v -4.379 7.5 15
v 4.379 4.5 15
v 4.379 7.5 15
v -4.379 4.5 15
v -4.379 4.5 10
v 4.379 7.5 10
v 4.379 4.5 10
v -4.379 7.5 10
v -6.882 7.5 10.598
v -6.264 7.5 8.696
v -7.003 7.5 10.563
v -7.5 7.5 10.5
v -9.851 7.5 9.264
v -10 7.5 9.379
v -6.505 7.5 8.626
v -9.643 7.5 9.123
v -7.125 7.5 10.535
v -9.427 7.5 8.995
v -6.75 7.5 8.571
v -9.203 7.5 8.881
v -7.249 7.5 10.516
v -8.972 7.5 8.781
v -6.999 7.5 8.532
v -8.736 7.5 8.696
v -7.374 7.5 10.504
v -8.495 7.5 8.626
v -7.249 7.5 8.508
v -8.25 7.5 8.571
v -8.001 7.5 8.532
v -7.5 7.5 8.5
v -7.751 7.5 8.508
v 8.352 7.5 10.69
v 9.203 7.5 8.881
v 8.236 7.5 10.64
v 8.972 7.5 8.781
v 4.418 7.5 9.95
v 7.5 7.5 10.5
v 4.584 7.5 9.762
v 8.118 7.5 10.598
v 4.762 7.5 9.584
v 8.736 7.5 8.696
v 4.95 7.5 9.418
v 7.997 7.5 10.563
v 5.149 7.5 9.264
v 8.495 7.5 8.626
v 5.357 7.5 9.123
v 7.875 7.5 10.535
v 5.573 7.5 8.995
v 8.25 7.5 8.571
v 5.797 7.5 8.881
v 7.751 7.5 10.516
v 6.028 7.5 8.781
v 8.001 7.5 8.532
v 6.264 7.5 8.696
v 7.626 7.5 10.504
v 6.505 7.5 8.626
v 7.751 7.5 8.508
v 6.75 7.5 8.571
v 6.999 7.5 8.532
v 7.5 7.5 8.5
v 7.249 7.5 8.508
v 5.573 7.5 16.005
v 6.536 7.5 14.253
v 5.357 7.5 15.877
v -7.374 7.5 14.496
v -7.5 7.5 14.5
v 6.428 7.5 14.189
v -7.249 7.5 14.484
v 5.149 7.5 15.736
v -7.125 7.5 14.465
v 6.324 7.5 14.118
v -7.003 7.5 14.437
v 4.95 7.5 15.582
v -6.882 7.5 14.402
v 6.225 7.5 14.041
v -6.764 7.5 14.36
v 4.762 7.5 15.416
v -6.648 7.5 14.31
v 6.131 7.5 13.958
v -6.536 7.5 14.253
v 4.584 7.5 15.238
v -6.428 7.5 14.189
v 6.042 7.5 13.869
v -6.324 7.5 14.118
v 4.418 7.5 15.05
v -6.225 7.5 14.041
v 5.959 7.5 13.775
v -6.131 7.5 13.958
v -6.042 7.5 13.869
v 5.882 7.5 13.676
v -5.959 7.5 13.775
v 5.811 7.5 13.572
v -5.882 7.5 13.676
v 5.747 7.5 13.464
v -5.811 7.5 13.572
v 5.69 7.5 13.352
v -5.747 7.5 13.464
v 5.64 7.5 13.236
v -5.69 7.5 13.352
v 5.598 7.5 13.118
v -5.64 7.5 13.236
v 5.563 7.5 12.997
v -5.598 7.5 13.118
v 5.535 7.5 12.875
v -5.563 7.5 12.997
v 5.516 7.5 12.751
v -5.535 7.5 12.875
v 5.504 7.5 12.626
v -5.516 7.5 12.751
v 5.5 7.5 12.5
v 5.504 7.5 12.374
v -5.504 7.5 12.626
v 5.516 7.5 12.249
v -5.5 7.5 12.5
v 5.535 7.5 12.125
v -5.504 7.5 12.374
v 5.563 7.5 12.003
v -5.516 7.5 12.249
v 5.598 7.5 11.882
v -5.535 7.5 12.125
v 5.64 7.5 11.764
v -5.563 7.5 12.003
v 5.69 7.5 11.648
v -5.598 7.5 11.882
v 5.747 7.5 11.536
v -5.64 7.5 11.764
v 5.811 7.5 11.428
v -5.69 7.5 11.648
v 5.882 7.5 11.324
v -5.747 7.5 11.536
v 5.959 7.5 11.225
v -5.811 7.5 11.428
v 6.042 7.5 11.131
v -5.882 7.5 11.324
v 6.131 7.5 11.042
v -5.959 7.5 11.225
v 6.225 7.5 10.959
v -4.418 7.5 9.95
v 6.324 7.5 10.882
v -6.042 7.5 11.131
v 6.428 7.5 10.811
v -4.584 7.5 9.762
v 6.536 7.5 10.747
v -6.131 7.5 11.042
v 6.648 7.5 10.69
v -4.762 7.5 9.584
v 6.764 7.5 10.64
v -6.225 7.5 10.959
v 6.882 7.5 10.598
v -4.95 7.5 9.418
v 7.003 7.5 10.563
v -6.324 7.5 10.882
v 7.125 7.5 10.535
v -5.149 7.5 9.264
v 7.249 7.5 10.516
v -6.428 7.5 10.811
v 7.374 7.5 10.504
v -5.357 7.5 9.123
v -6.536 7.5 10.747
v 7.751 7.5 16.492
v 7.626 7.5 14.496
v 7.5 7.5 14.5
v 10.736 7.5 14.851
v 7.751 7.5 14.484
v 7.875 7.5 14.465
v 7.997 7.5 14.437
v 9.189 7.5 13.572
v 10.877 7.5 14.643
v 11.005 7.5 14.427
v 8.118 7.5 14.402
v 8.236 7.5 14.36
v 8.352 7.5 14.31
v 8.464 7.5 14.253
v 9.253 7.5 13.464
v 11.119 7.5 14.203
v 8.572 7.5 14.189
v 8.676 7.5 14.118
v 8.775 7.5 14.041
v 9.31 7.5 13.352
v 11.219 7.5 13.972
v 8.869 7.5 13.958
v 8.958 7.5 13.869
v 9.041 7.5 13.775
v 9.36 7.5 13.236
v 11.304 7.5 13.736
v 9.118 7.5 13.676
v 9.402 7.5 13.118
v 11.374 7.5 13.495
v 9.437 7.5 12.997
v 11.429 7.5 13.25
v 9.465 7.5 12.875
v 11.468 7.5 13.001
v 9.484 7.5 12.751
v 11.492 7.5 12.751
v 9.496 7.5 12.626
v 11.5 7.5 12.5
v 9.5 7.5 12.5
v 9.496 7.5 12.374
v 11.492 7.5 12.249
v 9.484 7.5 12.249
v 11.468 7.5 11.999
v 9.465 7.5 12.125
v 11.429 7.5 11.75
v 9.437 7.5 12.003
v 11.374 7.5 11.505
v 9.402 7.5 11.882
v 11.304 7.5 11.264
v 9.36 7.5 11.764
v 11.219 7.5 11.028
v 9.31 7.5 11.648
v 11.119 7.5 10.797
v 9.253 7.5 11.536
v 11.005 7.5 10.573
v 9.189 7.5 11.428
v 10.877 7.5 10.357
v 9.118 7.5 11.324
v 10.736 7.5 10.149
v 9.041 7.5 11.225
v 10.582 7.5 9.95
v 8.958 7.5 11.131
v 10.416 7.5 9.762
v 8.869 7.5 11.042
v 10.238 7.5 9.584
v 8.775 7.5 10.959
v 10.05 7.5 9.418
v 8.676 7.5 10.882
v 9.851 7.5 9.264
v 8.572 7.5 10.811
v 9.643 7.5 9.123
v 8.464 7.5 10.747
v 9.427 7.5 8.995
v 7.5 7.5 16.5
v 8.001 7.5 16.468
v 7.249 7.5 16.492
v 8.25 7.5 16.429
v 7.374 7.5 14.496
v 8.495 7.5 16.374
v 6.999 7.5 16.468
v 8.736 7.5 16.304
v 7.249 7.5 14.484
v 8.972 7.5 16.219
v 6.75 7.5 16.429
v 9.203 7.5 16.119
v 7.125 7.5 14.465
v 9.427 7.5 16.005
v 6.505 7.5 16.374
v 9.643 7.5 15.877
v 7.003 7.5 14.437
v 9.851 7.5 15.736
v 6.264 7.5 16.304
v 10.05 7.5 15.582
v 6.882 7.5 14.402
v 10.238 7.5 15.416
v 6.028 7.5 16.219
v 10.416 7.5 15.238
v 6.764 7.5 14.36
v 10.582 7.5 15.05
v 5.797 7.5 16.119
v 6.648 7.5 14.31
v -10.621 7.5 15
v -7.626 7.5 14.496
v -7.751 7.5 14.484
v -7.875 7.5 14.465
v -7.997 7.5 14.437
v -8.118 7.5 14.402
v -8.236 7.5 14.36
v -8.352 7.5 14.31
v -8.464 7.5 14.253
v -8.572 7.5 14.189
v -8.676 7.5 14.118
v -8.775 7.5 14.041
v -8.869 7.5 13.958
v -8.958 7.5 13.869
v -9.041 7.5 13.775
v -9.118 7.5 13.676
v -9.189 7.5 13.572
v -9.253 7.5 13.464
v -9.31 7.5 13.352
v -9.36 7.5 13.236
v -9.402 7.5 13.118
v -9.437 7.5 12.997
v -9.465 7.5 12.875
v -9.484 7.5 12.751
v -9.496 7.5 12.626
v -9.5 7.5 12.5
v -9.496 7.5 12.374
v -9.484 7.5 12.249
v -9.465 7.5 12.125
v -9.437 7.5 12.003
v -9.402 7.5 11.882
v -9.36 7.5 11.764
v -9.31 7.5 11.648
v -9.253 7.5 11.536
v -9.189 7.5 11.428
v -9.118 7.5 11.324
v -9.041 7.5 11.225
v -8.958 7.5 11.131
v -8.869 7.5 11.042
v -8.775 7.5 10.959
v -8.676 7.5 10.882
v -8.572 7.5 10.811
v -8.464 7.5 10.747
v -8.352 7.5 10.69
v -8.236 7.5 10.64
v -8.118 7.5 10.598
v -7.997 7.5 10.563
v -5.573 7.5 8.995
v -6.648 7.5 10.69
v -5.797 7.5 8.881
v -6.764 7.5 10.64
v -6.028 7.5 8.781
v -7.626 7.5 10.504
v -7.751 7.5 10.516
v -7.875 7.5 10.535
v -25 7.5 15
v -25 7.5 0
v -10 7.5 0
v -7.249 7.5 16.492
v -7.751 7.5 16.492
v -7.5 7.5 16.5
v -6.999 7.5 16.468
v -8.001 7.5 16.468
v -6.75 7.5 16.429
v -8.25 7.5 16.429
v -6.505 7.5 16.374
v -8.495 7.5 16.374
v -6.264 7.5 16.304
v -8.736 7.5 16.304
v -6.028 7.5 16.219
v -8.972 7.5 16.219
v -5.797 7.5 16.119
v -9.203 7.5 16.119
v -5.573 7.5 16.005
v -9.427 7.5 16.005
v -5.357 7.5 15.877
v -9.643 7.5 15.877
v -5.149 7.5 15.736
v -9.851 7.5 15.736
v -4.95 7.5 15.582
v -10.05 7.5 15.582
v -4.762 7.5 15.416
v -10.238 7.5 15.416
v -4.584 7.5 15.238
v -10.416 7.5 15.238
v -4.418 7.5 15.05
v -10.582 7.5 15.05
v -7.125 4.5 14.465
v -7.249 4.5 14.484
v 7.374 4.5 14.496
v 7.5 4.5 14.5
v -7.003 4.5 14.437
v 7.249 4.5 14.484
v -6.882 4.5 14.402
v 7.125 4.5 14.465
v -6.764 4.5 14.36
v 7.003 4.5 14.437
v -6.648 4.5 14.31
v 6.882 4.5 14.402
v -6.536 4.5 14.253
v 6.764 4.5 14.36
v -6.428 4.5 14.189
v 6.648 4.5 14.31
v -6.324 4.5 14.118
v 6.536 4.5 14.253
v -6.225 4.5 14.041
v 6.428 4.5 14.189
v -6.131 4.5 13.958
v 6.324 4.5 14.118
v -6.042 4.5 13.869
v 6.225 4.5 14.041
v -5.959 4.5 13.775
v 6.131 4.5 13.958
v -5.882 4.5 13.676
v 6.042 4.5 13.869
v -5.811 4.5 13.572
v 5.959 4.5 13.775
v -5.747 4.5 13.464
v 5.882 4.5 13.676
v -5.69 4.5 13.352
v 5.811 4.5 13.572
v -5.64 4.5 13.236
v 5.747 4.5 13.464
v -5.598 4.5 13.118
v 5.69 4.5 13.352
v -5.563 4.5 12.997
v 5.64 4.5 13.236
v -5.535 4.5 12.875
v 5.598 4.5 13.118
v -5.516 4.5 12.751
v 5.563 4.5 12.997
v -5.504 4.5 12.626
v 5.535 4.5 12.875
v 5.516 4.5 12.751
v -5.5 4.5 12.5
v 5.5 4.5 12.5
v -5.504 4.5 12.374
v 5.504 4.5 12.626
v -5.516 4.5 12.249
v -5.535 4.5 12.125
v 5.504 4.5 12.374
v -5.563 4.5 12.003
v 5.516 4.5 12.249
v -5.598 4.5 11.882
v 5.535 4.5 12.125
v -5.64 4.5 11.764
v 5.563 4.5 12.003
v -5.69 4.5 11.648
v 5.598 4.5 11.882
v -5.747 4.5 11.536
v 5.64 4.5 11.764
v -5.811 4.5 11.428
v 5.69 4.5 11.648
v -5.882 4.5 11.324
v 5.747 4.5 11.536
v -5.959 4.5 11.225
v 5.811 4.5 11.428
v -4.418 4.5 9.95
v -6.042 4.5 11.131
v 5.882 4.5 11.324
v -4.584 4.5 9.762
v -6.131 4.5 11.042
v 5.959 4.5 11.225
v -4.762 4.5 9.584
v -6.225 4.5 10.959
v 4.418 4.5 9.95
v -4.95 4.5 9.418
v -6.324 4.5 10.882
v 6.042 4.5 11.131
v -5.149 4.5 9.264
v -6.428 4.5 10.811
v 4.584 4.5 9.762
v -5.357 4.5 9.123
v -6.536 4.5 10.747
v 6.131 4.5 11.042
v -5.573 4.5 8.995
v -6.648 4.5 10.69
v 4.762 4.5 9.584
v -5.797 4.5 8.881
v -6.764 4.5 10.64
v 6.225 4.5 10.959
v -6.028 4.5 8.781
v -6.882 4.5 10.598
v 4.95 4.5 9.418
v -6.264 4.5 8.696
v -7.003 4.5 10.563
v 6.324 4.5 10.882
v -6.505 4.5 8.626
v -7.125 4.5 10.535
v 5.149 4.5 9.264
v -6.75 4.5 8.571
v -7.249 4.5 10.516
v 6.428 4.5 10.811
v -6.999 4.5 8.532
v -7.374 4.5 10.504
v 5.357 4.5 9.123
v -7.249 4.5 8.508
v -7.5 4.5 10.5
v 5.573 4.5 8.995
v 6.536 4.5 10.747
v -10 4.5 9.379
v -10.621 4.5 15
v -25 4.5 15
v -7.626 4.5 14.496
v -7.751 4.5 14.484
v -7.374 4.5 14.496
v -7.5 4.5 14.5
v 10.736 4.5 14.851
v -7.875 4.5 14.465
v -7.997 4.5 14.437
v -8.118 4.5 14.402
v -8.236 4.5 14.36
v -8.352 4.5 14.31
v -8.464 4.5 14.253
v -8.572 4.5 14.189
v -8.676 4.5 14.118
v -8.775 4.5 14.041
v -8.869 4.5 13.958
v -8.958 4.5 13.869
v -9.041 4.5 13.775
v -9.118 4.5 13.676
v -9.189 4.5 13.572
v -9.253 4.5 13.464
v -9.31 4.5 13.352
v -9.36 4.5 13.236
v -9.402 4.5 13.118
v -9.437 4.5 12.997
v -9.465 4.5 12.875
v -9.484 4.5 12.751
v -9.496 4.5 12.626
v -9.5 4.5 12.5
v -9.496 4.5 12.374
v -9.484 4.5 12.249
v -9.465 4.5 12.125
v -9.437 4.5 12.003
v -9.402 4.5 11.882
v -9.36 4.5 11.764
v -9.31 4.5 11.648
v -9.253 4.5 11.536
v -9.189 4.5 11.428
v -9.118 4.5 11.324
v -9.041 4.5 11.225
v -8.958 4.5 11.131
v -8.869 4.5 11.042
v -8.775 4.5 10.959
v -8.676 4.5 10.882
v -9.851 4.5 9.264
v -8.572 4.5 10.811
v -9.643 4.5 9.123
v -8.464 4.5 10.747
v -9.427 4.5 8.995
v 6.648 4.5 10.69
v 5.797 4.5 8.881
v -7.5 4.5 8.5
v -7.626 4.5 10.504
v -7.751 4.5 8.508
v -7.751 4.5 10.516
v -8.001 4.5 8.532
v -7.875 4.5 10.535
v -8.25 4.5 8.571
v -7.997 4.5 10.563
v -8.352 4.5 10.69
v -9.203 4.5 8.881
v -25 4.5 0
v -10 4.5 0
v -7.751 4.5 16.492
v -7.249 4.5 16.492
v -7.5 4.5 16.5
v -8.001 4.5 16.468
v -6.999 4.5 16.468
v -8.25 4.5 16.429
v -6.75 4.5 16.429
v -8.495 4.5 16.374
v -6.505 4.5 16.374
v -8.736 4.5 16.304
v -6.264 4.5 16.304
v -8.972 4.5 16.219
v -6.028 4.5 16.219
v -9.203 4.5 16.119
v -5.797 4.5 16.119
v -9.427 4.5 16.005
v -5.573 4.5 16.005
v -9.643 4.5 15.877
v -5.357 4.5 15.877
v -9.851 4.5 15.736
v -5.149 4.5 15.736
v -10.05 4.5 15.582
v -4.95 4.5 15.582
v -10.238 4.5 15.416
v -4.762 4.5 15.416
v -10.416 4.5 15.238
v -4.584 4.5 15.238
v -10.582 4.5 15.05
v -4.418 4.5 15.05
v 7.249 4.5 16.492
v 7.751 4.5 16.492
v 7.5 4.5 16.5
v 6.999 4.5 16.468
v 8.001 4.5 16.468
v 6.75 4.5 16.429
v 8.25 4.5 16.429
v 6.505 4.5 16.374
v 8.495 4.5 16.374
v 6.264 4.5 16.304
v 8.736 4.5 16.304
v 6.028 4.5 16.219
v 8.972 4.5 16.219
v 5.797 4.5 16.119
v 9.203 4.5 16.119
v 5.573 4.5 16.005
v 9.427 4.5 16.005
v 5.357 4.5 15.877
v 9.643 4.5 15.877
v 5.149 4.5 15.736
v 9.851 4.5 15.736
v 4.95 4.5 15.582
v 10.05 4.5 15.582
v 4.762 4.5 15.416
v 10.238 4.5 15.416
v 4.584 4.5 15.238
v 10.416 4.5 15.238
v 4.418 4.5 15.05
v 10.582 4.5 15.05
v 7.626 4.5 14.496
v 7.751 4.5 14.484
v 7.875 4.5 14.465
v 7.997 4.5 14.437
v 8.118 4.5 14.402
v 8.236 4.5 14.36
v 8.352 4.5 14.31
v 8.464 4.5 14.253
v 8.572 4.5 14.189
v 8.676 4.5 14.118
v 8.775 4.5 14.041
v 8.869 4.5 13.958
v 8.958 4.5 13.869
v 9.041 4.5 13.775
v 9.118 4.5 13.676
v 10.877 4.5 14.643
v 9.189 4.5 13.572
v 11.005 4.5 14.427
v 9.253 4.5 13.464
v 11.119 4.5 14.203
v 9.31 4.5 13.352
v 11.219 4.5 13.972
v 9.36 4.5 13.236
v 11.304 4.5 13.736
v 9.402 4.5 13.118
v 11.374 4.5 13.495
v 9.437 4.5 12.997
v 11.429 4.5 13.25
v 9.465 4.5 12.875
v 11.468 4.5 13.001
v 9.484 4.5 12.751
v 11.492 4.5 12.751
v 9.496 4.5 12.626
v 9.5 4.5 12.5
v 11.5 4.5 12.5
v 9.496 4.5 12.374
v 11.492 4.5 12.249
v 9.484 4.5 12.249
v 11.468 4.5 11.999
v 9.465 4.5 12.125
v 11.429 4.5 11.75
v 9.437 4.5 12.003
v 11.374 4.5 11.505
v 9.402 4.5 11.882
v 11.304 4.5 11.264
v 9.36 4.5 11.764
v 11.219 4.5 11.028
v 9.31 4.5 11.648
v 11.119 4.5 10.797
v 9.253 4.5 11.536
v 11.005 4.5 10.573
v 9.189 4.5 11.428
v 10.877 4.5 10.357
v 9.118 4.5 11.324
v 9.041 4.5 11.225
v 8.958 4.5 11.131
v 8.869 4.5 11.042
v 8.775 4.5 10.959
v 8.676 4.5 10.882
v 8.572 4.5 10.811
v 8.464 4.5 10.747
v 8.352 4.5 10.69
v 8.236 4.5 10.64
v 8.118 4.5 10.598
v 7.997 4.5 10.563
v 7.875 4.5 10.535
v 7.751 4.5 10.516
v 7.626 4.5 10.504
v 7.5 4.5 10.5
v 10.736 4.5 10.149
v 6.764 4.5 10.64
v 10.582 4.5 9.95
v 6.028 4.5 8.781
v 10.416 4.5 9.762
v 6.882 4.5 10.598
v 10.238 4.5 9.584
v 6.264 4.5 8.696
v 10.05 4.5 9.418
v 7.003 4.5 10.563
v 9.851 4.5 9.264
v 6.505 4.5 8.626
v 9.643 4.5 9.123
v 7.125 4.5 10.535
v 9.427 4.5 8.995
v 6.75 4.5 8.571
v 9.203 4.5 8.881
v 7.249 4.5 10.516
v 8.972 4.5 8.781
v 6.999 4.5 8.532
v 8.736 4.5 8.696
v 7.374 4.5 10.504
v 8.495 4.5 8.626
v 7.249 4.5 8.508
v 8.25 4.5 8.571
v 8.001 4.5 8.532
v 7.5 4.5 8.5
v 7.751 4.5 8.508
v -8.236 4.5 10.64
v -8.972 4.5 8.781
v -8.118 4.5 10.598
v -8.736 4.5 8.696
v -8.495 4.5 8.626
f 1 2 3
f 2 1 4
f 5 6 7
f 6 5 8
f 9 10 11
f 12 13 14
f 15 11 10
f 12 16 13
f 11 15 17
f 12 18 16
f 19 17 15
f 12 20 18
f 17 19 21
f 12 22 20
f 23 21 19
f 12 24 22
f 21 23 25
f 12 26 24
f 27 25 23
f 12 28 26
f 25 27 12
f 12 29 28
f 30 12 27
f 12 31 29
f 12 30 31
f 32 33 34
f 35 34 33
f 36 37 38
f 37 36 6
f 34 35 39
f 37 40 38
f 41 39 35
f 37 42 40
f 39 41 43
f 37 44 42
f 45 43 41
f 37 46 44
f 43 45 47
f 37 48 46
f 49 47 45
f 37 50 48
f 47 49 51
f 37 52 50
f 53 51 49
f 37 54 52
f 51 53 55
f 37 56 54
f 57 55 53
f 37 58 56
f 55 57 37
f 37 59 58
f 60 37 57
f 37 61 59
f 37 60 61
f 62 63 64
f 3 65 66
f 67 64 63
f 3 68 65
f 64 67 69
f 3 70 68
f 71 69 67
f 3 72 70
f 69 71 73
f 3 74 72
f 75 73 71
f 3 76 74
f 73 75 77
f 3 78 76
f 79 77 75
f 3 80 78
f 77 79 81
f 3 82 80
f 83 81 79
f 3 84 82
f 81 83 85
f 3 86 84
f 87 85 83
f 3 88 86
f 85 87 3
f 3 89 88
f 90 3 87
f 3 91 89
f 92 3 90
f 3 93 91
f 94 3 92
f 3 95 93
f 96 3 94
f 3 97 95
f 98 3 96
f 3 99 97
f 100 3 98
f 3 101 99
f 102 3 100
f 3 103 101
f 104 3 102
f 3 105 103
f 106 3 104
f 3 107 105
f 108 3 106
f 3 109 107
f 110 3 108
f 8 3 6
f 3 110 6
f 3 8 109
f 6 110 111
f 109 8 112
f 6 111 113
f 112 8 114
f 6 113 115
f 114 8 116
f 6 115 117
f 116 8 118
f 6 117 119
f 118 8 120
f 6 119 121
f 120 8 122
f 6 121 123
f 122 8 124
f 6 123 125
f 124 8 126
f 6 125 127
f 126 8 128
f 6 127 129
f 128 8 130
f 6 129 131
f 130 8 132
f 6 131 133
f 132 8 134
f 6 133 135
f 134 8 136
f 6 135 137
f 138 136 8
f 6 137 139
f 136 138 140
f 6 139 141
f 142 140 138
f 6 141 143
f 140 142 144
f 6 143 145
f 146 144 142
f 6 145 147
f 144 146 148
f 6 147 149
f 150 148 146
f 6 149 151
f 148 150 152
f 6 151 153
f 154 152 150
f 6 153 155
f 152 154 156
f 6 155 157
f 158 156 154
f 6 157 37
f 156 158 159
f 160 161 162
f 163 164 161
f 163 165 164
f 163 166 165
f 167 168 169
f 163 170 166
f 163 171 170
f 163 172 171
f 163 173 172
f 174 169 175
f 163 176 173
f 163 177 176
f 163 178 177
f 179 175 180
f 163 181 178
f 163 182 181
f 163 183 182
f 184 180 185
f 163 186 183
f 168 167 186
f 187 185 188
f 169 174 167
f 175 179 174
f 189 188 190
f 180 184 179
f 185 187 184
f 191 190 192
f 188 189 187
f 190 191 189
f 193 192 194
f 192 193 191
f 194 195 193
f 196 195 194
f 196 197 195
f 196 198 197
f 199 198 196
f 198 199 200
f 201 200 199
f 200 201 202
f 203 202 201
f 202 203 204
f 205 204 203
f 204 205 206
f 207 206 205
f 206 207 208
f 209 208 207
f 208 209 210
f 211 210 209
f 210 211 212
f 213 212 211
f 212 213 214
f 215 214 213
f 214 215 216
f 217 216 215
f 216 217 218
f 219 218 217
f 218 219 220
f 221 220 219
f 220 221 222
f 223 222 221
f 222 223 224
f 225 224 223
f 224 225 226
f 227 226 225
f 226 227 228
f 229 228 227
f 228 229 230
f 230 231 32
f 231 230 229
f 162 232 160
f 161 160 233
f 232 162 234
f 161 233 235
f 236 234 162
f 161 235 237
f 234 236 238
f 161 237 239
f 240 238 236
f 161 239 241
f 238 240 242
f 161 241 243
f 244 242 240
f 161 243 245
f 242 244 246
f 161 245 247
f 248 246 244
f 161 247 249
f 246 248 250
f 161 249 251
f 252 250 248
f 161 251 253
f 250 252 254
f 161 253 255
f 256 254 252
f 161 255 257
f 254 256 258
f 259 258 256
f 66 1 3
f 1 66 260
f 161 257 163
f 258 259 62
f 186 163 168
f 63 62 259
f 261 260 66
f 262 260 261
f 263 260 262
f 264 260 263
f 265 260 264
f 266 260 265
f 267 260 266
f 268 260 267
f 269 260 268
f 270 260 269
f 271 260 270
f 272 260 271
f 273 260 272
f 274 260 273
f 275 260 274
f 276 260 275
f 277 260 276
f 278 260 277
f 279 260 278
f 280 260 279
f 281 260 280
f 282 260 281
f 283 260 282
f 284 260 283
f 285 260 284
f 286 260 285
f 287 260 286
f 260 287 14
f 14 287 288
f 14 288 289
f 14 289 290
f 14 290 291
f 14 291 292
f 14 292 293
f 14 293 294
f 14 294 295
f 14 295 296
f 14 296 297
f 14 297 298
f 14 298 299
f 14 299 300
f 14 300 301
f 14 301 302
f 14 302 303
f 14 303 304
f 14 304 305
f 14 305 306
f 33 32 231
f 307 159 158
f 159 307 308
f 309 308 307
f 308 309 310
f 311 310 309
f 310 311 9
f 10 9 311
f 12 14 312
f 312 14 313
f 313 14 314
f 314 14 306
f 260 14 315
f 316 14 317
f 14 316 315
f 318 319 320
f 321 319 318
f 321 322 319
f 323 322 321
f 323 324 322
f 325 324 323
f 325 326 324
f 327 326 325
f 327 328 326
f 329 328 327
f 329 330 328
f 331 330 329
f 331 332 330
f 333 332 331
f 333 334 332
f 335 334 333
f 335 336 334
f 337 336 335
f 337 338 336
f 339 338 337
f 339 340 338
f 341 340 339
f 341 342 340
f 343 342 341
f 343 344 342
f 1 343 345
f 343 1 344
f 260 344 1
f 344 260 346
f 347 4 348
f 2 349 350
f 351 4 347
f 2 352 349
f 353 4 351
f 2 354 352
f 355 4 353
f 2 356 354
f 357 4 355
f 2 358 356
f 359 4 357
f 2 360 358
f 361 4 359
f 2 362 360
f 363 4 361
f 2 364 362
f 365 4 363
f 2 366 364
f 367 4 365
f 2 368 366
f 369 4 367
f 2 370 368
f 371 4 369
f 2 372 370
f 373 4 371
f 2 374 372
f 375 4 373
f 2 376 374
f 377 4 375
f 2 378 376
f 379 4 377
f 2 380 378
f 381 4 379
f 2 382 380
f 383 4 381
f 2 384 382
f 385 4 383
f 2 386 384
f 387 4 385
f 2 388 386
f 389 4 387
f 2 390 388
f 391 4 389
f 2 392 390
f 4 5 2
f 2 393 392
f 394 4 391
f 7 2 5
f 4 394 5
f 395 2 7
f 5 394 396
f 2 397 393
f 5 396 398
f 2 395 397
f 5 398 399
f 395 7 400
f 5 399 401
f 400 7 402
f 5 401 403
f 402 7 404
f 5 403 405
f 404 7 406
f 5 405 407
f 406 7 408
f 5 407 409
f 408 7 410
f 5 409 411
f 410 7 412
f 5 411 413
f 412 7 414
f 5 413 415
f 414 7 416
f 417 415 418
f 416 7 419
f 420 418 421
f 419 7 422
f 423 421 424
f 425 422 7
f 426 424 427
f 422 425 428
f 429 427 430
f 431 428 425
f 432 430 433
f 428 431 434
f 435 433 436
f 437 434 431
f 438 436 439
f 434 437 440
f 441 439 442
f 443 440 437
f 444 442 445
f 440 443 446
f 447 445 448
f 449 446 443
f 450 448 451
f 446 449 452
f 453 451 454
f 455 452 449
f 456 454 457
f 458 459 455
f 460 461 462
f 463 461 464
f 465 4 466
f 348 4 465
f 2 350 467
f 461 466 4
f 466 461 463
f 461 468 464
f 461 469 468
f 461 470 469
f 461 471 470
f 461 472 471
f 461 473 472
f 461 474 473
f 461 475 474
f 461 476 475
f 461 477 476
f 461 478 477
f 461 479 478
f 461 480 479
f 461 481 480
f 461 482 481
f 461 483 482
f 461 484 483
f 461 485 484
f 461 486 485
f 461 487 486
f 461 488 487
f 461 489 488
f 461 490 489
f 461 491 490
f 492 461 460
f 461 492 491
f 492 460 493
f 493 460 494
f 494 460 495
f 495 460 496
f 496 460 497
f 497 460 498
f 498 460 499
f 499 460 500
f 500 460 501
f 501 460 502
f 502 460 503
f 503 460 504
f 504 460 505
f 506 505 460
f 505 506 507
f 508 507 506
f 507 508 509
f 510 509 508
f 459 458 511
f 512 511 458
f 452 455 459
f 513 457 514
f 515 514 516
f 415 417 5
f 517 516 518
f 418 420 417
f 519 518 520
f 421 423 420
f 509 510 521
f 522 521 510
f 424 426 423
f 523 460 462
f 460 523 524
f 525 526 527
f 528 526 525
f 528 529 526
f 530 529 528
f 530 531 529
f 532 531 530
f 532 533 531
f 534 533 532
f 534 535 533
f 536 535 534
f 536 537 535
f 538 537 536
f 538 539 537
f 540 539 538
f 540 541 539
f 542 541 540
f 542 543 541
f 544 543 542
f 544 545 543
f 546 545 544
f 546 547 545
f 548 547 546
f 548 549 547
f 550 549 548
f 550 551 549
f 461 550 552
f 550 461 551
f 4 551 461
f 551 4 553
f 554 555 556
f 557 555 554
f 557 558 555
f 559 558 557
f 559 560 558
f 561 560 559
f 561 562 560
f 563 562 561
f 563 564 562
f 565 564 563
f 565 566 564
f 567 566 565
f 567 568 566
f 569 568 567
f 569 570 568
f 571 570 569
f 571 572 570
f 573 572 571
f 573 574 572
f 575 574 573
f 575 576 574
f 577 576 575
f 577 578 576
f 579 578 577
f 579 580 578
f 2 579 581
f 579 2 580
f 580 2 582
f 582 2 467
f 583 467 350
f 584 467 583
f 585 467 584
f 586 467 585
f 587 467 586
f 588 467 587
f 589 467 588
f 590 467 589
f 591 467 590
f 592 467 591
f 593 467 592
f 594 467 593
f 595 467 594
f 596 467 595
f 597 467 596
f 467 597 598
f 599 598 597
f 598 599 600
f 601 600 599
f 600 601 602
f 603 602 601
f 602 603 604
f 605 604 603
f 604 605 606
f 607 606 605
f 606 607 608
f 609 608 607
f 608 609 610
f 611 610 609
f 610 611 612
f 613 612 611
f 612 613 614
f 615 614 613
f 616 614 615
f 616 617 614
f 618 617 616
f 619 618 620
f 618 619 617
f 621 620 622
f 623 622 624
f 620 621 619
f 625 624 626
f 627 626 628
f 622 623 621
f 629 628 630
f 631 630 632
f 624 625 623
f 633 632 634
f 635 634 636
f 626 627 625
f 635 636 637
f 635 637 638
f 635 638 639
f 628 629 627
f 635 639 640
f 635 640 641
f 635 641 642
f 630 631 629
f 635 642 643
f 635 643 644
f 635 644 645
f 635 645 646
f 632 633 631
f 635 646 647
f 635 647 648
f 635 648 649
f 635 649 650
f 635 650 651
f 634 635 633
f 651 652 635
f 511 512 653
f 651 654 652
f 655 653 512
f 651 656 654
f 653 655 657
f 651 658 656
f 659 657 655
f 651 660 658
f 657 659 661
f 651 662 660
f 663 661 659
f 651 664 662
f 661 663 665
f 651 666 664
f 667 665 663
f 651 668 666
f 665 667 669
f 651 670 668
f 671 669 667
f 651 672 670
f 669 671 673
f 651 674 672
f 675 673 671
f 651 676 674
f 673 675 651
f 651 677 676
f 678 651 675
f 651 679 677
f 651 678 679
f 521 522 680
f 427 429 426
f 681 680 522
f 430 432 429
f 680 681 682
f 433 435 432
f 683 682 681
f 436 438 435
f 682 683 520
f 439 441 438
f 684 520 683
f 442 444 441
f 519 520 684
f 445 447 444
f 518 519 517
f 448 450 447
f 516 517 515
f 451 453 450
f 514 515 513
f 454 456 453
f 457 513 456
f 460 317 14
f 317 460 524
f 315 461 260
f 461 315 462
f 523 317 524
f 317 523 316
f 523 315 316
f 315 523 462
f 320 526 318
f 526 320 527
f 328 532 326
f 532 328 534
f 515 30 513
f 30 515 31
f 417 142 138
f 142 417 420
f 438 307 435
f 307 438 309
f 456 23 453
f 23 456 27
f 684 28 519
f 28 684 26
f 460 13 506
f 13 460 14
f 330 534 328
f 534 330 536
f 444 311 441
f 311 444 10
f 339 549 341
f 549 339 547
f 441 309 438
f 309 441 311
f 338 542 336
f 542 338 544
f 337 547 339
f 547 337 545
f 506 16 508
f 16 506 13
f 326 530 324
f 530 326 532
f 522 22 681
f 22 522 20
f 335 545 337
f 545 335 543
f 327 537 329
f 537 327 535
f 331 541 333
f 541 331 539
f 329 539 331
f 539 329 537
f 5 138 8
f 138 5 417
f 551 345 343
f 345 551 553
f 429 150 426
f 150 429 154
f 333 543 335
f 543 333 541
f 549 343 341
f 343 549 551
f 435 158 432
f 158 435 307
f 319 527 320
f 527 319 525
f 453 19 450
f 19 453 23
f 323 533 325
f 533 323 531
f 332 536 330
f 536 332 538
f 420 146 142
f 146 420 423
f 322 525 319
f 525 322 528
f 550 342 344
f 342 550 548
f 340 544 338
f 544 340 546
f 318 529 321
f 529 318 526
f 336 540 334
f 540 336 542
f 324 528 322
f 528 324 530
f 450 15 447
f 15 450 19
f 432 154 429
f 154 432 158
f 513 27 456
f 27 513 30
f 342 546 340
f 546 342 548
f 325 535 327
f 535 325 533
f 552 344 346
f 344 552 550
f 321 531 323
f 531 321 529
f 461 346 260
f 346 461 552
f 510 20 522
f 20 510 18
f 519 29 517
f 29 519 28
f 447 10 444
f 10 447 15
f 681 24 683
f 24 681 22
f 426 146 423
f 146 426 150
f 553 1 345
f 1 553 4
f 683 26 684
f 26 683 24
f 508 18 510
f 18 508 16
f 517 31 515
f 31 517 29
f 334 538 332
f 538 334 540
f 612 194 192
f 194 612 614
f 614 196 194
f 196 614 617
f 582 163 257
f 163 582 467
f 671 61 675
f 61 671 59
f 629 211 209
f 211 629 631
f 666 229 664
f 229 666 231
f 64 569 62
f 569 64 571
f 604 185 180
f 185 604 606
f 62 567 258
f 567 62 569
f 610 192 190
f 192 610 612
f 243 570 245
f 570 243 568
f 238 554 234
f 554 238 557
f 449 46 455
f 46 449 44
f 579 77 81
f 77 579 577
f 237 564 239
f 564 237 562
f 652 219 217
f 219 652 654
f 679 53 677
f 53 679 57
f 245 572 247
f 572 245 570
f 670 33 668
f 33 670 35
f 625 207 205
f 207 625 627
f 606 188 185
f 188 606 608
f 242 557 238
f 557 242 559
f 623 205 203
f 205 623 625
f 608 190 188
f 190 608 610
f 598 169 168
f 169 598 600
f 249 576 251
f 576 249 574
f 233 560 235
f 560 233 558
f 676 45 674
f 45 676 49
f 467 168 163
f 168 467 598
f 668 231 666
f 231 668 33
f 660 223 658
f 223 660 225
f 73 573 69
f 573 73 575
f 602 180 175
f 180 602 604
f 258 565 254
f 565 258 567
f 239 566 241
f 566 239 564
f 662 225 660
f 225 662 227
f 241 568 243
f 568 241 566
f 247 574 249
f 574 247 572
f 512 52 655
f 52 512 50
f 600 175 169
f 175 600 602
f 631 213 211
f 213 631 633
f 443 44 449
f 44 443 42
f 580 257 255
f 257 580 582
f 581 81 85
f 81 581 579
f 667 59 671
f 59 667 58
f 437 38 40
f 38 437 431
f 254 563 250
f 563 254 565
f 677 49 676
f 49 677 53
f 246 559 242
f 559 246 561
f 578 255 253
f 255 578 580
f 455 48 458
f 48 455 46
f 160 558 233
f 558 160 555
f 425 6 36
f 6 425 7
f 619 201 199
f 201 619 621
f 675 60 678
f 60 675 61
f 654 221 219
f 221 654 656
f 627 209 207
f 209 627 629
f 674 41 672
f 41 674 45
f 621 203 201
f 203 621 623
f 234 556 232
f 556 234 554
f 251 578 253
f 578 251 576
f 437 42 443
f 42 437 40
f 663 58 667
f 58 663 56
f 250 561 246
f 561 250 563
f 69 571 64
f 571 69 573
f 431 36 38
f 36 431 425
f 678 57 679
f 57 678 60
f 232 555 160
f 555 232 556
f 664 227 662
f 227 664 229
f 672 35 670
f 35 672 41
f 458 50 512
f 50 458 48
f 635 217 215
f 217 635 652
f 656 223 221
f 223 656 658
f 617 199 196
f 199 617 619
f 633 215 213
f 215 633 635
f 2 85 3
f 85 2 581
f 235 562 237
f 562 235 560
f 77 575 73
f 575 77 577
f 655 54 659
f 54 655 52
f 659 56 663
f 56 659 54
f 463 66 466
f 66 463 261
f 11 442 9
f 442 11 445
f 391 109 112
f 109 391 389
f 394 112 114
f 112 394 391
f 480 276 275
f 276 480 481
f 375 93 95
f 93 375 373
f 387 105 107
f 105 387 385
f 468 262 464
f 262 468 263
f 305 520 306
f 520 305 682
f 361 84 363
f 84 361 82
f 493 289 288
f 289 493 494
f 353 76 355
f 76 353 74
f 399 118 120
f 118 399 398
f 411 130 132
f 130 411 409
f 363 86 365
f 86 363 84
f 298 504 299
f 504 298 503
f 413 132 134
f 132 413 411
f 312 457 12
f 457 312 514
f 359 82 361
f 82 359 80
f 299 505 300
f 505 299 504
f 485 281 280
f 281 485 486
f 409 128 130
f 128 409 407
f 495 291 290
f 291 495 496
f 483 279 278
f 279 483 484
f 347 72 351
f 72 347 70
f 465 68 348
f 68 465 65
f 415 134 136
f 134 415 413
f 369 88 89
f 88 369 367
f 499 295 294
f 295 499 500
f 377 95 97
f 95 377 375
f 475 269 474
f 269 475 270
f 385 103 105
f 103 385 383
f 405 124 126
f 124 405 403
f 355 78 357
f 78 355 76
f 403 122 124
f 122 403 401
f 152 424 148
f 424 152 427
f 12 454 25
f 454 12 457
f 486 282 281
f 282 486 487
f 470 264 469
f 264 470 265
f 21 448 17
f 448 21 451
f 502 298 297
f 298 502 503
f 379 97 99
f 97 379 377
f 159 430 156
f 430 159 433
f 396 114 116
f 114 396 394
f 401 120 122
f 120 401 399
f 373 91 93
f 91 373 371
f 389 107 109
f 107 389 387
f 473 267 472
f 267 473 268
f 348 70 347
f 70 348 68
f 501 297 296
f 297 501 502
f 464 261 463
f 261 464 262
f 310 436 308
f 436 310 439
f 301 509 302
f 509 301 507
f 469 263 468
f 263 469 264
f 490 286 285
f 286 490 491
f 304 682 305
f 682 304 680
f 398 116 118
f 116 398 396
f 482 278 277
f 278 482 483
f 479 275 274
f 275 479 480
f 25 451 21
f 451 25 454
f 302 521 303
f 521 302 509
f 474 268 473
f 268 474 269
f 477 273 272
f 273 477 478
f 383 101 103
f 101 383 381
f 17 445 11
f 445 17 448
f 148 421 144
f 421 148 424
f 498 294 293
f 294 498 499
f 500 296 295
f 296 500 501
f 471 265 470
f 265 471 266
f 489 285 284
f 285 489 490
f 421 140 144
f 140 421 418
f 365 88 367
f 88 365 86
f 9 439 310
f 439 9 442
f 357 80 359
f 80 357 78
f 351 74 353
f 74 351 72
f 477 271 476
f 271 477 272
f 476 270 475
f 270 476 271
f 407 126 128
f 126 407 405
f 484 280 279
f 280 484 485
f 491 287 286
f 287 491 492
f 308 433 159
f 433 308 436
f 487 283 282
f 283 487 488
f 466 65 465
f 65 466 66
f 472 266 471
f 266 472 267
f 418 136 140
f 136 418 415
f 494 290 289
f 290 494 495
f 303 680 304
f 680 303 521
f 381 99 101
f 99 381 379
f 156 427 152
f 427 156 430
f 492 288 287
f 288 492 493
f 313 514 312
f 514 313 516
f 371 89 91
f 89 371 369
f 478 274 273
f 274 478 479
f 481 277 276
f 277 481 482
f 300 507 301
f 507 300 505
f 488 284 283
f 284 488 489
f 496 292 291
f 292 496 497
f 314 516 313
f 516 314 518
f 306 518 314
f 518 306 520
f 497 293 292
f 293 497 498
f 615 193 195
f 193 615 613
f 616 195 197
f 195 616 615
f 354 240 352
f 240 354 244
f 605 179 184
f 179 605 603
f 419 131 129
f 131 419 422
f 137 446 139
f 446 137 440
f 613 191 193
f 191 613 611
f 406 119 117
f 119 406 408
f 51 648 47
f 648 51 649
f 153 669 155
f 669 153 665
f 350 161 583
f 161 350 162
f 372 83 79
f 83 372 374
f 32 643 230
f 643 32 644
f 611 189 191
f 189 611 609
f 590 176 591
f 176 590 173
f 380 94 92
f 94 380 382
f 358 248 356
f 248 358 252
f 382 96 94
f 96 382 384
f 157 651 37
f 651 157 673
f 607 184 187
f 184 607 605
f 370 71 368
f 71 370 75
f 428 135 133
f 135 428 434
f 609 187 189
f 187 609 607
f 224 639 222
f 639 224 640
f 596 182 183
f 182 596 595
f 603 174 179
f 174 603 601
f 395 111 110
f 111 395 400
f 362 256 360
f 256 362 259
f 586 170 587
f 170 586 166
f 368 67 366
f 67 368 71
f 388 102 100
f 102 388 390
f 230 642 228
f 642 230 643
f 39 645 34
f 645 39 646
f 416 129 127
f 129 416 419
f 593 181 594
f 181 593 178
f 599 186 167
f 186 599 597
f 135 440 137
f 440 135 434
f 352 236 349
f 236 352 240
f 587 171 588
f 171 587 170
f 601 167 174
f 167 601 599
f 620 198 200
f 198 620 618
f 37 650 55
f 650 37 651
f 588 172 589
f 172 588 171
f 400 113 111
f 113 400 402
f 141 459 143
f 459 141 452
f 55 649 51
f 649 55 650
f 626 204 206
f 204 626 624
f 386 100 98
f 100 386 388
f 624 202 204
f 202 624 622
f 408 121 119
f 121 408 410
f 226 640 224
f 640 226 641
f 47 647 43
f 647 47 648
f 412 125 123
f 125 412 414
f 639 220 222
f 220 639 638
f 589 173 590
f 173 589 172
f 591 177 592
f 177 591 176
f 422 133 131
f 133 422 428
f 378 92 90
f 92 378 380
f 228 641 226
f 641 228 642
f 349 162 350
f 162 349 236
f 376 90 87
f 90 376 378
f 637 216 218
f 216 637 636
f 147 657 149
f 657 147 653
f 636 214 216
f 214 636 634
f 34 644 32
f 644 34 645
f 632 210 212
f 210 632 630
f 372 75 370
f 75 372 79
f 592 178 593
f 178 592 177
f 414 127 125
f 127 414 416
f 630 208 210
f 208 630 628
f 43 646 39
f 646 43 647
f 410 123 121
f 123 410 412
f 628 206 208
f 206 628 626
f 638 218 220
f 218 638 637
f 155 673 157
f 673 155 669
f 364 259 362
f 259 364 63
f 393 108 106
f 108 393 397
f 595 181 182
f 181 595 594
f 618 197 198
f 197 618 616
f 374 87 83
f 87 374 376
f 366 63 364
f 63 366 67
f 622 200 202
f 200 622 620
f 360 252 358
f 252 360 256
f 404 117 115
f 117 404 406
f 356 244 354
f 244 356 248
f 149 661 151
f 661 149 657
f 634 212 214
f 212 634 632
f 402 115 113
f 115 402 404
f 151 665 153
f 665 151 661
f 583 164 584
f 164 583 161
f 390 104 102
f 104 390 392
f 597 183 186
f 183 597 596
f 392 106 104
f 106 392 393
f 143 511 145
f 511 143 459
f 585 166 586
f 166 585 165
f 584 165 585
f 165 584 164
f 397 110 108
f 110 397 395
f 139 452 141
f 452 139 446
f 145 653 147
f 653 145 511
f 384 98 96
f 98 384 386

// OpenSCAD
difference(){
	union(){
        
        translate([-8,4.5,10]){
            cube([15,3,5], center=false);
        }         
        translate([-25,4.5,0]){
            cube([15,3,15], center=false);
        }         
        translate([-7.5,7.5,12.5]){
            rotate([90,0,0]){
                cylinder(h=3, r=4, $fn=100, center=false);
            }
        }         
        translate([7.5,7.5,12.5]){
            rotate([90,0,0]){
                cylinder(h=3, r=4, $fn=100, center=false);
            }
        }         


	}
	union() {

        translate([-7.5,8.5,12.5]){
            rotate([90,0,0]){
                cylinder(h=25, r=2, $fn=100, center=false);
            }
        }         
        translate([7.5,8.5,12.5]){
            rotate([90,0,0]){
                cylinder(h=25, r=2, $fn=100, center=false);
            }
        }             


	}
}
